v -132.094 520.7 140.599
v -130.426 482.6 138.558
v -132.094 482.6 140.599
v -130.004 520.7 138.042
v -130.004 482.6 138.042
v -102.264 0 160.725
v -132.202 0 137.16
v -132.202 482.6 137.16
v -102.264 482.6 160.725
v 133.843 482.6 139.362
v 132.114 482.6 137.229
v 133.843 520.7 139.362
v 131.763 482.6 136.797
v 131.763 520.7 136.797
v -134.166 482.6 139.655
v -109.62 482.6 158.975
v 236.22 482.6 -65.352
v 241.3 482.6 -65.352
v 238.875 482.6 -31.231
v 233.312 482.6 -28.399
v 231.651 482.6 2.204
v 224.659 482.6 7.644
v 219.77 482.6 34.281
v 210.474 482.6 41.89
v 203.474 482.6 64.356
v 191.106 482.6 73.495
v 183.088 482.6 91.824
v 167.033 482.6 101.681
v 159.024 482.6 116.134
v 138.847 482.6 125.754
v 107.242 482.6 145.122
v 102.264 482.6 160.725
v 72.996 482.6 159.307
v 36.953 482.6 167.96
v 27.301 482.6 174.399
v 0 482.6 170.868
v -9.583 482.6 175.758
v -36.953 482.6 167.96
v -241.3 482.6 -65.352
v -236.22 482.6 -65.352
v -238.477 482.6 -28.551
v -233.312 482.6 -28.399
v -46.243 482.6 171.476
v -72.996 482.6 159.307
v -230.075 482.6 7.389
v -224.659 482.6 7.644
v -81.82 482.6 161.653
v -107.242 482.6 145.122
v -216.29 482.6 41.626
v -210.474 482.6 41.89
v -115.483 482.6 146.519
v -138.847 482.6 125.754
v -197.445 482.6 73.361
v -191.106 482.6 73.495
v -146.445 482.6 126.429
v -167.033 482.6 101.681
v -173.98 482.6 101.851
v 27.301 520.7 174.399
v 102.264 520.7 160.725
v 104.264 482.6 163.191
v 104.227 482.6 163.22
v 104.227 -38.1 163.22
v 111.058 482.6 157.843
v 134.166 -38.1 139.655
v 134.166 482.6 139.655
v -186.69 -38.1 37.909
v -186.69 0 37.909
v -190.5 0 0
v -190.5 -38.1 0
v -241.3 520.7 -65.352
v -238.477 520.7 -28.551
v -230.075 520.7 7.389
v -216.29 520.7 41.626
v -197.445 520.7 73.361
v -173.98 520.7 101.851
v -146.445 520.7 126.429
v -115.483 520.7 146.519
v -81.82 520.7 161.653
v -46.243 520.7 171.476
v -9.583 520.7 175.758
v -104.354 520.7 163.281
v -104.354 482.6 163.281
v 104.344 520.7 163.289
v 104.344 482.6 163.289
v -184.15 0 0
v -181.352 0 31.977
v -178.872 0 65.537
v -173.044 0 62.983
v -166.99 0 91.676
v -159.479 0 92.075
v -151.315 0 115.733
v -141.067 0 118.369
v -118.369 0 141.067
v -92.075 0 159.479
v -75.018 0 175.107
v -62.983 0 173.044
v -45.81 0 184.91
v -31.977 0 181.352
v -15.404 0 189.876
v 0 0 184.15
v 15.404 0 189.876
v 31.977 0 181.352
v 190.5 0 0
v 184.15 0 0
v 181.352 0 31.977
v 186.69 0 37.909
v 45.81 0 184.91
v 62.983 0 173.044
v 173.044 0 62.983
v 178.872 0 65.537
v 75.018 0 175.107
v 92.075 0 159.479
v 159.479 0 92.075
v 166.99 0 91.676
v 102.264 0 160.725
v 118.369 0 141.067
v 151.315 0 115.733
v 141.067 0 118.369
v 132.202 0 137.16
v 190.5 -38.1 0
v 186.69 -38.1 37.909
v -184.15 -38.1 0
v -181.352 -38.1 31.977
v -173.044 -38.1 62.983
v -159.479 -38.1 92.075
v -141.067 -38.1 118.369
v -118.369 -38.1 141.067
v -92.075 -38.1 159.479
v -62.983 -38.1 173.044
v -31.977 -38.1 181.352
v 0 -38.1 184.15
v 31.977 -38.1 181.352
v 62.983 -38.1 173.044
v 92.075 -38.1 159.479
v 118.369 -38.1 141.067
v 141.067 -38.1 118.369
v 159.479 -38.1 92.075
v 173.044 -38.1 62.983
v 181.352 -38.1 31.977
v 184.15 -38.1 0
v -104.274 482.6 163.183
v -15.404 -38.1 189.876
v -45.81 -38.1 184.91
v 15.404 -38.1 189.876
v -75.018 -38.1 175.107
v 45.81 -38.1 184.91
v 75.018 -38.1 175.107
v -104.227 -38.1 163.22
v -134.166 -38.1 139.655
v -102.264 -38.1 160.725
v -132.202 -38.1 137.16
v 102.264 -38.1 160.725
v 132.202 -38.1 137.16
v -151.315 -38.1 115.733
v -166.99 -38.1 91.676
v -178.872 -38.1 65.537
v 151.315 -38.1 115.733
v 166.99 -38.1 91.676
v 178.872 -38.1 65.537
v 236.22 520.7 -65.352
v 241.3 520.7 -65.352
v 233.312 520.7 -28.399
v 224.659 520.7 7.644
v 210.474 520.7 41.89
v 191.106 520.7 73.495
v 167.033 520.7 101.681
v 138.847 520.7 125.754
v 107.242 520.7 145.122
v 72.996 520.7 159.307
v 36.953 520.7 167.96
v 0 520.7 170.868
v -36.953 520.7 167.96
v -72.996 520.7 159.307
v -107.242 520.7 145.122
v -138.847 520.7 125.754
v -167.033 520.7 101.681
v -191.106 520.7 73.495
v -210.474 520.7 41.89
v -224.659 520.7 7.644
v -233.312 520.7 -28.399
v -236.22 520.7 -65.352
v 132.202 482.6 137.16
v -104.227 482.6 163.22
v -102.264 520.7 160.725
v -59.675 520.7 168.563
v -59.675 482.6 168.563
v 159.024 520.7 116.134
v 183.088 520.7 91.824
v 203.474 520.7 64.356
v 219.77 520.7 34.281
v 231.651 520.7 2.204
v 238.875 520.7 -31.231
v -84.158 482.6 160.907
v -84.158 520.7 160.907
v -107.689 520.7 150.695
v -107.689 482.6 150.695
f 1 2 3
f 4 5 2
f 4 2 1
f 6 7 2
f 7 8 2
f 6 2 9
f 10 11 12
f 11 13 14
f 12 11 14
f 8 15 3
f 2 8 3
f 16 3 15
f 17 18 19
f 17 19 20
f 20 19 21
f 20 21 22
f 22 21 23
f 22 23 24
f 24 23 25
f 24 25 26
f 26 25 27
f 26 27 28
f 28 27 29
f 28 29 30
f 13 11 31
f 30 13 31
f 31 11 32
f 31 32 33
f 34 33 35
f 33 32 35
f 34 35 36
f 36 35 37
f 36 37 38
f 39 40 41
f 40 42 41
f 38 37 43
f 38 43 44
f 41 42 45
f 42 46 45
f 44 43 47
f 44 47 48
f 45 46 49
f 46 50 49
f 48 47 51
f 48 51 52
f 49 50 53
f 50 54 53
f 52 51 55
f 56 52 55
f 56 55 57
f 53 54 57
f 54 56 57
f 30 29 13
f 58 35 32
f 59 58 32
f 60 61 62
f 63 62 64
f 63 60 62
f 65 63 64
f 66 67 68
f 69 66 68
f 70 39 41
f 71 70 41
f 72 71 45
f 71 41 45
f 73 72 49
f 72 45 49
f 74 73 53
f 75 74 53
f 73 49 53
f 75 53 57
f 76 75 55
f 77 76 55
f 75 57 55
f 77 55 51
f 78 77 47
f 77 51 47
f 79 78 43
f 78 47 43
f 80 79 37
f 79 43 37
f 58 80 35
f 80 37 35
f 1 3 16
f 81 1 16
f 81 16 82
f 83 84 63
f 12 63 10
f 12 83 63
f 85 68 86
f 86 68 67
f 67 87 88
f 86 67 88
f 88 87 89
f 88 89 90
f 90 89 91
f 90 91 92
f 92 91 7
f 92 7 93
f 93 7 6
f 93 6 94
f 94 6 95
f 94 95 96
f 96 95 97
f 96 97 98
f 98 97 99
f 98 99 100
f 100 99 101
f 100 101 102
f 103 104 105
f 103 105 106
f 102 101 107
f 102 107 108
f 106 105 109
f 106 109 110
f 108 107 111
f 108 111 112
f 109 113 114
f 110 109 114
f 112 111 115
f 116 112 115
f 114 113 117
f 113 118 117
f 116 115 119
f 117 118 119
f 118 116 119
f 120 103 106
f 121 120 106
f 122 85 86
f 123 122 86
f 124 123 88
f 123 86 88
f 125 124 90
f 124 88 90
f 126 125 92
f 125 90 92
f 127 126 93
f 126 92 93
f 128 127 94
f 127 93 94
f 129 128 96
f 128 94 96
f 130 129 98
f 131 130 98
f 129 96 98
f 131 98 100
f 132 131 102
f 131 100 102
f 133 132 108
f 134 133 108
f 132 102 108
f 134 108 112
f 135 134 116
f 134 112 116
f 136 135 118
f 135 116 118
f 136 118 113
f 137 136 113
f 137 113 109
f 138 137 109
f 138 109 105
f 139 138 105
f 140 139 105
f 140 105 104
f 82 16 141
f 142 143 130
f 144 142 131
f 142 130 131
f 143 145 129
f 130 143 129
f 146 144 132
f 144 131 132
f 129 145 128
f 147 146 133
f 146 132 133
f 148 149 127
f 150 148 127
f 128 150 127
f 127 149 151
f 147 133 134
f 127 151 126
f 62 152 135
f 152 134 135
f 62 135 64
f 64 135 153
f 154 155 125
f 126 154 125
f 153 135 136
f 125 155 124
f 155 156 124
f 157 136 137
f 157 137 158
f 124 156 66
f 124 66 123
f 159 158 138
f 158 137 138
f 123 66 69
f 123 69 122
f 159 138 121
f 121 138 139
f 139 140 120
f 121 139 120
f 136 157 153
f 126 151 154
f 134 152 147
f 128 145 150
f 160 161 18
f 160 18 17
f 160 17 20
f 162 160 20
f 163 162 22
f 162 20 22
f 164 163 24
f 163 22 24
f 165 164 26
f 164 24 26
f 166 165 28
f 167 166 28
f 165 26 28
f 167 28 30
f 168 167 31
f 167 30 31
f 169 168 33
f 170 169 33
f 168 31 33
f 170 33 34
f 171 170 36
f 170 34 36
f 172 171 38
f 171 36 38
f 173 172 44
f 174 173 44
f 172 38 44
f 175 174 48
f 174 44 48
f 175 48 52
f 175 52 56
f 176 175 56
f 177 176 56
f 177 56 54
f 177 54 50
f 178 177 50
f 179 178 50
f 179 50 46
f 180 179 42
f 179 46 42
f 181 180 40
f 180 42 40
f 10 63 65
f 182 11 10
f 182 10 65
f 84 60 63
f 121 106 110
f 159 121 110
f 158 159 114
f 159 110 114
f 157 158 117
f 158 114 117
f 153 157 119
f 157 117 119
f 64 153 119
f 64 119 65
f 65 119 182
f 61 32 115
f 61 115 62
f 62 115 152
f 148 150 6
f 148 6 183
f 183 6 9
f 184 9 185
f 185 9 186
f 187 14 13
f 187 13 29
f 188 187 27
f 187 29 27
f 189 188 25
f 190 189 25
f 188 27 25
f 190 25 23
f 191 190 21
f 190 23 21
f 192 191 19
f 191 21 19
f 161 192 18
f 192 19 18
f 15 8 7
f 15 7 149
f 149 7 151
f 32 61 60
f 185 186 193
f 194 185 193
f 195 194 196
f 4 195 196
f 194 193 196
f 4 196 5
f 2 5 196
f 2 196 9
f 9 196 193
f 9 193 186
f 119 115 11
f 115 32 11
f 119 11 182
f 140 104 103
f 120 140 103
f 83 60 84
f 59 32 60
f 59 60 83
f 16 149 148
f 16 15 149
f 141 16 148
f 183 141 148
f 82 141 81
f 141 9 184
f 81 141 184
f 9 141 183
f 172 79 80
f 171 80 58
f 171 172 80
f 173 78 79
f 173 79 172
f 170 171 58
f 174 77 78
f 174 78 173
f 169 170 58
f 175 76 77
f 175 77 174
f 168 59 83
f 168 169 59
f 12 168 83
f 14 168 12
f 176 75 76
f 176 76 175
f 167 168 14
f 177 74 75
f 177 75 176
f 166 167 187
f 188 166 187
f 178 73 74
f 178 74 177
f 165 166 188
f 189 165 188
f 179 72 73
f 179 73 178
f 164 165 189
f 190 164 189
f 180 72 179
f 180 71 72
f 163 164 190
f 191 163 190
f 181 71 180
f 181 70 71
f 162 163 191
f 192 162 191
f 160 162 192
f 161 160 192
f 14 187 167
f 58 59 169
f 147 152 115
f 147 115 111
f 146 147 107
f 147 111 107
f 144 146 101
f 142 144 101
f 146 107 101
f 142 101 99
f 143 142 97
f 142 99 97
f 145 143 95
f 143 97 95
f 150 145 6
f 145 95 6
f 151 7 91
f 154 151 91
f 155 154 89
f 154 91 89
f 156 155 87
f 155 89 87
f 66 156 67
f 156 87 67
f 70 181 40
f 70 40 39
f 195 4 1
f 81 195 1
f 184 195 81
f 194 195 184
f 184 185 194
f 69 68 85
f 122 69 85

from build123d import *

# Parameters (mm, degrees)
F1_DEPTH  = 38.1
F2_W      = 38.1
F2_H      = 38.1
F2_H_2    = 482.6
F3_DEPTH  = 3.175
F4_W      = 38.1
F4_H      = 38.1
F4_H_2    = 482.6
F5_DEPTH  = 3.175
F8_DEPTH  = 38.1
F9_DEPTH  = 38.1
F10_W     = 37.9836630458
F10_H     = 38.1
F11_DEPTH = 3.302
F12_DEPTH = 3.302


with BuildPart() as f1:
    # F0 (on Front) → F1 (new body)
    with BuildSketch(Plane.XZ):
        with BuildLine():
            Line((190.5, 0), (186.69, 37.9090213538))
            ThreePointArc((186.69, 37.9090213538), (166.9901958546, 91.6761936843), (132.2020589855, 137.16))
            Line((132.2020589855, 137.16), (102.2635224311, 160.72467757))
            ThreePointArc((102.2635224311, 160.72467757), (0, 190.5), (-102.2635224311, 160.72467757))
            Line((-102.2635224311, 160.72467757), (-132.2020589855, 137.16))
            ThreePointArc((-132.2020589855, 137.16), (-166.9901958546, 91.6761936843), (-186.69, 37.9090213538))
            Line((-186.69, 37.9090213538), (-190.5, 0))
            Line((-190.5, 0), (-184.15, 0))
            ThreePointArc((-184.15, 0), (0, 184.15), (184.15, 0))
            Line((184.15, 0), (190.5, 0))
        make_face()
    extrude(amount=F1_DEPTH)

    # F2 (on face) → F3 (join)
    with BuildSketch(Plane(origin=(-117.2327907083, 0, 148.942338785), x_dir=(0.785788361, 0, 0.6184954743), z_dir=(-0.6184954743, 0, 0.785788361))):
        with Locations((0, -19.05)):
            Rectangle(F2_W, F2_H)
        with Locations((0, 241.3)):
            Rectangle(F2_W, F2_H_2)
    extrude(amount=F3_DEPTH)

    # F4 (on face) → F5 (join)
    with BuildSketch(Plane(origin=(117.2327907083, 0, 148.942338785), x_dir=(0.785788361, 0, -0.6184954743), z_dir=(0.6184954743, 0, 0.785788361))):
        with Locations((0, -19.05)):
            Rectangle(F4_W, F4_H)
        with Locations((0, 241.3)):
            Rectangle(F4_W, F4_H_2)
    extrude(amount=F5_DEPTH)

    # F7 (on face) → F8 (join)
    with BuildSketch(Plane(origin=(0, 482.6, 0), x_dir=(-1, 0, 0), z_dir=(0, 1, 0))):
        with BuildLine():
            Line((130.004232963, 138.0423993869), (102.2635224311, 160.72467757))
            Line((102.2635224311, 160.72467757), (59.6745645386, 168.5625927845))
            ThreePointArc((59.6745645386, 168.5625927845), (96.0592635131, 156.1135098671), (130.004232963, 138.0423993869))
        make_face()
    extrude(amount=F8_DEPTH)



with BuildPart() as f9:
    # F6 (on face) → F9 (new body)
    with BuildSketch(Plane(origin=(0, 482.6, 0), x_dir=(-1, 0, 0), z_dir=(0, 1, 0))):
        with BuildLine():
            Line((236.22, -65.3515389739), (241.3, -65.3515389739))
            ThreePointArc((241.3, -65.3515389739), (160.6830293096, 114.6669436658), (-27.3005312217, 174.3991043934))
            Line((-27.3005312217, 174.3991043934), (-59.1095722207, 168.5966357826))
            ThreePointArc((-59.1095722207, 168.5966357826), (-96.7518090552, 155.7022496038), (-131.7632866386, 136.7972337016))
            ThreePointArc((-131.7632866386, 136.7972337016), (-212.1558048533, 49.607603625), (-241.3, -65.3515389739))
            Line((-241.3, -65.3515389739), (-236.22, -65.3515389739))
            ThreePointArc((-236.22, -65.3515389739), (0, 170.8684610261), (236.22, -65.3515389739))
        make_face()
        with BuildLine():
            ThreePointArc((-131.7632866386, 136.7972337016), (-96.7518090552, 155.7022496038), (-59.1095722207, 168.5966357826))
            Line((-59.1095722207, 168.5966357826), (-102.2635224311, 160.72467757))
            Line((-102.2635224311, 160.72467757), (-131.7632866386, 136.7972337016))
        make_face()
    extrude(amount=F9_DEPTH)


with BuildPart() as f1_1:
    add(f1.part)

    add(f9.part)  # F11 merges F9
    # F10 (on face) → F11 (join)
    with BuildSketch(Plane(origin=(119.2135098748, 0, 146.9764363882), x_dir=(0.7766434789, 0, -0.6299403994), z_dir=(0.6299403994, 0, 0.7766434789))):
        with Locations((-2.8328382326, 501.65)):
            Rectangle(F10_W, F10_H)
    extrude(amount=F11_DEPTH)

    # F12 (add): a face of the model
    f12_faces = [f1_1.faces().sort_by_distance(p)[0] for p in [
        (-116.133877697, 501.65, 149.3835384785),
    ]]
    extrude(f12_faces, amount=F12_DEPTH)


solid = f1_1.part
